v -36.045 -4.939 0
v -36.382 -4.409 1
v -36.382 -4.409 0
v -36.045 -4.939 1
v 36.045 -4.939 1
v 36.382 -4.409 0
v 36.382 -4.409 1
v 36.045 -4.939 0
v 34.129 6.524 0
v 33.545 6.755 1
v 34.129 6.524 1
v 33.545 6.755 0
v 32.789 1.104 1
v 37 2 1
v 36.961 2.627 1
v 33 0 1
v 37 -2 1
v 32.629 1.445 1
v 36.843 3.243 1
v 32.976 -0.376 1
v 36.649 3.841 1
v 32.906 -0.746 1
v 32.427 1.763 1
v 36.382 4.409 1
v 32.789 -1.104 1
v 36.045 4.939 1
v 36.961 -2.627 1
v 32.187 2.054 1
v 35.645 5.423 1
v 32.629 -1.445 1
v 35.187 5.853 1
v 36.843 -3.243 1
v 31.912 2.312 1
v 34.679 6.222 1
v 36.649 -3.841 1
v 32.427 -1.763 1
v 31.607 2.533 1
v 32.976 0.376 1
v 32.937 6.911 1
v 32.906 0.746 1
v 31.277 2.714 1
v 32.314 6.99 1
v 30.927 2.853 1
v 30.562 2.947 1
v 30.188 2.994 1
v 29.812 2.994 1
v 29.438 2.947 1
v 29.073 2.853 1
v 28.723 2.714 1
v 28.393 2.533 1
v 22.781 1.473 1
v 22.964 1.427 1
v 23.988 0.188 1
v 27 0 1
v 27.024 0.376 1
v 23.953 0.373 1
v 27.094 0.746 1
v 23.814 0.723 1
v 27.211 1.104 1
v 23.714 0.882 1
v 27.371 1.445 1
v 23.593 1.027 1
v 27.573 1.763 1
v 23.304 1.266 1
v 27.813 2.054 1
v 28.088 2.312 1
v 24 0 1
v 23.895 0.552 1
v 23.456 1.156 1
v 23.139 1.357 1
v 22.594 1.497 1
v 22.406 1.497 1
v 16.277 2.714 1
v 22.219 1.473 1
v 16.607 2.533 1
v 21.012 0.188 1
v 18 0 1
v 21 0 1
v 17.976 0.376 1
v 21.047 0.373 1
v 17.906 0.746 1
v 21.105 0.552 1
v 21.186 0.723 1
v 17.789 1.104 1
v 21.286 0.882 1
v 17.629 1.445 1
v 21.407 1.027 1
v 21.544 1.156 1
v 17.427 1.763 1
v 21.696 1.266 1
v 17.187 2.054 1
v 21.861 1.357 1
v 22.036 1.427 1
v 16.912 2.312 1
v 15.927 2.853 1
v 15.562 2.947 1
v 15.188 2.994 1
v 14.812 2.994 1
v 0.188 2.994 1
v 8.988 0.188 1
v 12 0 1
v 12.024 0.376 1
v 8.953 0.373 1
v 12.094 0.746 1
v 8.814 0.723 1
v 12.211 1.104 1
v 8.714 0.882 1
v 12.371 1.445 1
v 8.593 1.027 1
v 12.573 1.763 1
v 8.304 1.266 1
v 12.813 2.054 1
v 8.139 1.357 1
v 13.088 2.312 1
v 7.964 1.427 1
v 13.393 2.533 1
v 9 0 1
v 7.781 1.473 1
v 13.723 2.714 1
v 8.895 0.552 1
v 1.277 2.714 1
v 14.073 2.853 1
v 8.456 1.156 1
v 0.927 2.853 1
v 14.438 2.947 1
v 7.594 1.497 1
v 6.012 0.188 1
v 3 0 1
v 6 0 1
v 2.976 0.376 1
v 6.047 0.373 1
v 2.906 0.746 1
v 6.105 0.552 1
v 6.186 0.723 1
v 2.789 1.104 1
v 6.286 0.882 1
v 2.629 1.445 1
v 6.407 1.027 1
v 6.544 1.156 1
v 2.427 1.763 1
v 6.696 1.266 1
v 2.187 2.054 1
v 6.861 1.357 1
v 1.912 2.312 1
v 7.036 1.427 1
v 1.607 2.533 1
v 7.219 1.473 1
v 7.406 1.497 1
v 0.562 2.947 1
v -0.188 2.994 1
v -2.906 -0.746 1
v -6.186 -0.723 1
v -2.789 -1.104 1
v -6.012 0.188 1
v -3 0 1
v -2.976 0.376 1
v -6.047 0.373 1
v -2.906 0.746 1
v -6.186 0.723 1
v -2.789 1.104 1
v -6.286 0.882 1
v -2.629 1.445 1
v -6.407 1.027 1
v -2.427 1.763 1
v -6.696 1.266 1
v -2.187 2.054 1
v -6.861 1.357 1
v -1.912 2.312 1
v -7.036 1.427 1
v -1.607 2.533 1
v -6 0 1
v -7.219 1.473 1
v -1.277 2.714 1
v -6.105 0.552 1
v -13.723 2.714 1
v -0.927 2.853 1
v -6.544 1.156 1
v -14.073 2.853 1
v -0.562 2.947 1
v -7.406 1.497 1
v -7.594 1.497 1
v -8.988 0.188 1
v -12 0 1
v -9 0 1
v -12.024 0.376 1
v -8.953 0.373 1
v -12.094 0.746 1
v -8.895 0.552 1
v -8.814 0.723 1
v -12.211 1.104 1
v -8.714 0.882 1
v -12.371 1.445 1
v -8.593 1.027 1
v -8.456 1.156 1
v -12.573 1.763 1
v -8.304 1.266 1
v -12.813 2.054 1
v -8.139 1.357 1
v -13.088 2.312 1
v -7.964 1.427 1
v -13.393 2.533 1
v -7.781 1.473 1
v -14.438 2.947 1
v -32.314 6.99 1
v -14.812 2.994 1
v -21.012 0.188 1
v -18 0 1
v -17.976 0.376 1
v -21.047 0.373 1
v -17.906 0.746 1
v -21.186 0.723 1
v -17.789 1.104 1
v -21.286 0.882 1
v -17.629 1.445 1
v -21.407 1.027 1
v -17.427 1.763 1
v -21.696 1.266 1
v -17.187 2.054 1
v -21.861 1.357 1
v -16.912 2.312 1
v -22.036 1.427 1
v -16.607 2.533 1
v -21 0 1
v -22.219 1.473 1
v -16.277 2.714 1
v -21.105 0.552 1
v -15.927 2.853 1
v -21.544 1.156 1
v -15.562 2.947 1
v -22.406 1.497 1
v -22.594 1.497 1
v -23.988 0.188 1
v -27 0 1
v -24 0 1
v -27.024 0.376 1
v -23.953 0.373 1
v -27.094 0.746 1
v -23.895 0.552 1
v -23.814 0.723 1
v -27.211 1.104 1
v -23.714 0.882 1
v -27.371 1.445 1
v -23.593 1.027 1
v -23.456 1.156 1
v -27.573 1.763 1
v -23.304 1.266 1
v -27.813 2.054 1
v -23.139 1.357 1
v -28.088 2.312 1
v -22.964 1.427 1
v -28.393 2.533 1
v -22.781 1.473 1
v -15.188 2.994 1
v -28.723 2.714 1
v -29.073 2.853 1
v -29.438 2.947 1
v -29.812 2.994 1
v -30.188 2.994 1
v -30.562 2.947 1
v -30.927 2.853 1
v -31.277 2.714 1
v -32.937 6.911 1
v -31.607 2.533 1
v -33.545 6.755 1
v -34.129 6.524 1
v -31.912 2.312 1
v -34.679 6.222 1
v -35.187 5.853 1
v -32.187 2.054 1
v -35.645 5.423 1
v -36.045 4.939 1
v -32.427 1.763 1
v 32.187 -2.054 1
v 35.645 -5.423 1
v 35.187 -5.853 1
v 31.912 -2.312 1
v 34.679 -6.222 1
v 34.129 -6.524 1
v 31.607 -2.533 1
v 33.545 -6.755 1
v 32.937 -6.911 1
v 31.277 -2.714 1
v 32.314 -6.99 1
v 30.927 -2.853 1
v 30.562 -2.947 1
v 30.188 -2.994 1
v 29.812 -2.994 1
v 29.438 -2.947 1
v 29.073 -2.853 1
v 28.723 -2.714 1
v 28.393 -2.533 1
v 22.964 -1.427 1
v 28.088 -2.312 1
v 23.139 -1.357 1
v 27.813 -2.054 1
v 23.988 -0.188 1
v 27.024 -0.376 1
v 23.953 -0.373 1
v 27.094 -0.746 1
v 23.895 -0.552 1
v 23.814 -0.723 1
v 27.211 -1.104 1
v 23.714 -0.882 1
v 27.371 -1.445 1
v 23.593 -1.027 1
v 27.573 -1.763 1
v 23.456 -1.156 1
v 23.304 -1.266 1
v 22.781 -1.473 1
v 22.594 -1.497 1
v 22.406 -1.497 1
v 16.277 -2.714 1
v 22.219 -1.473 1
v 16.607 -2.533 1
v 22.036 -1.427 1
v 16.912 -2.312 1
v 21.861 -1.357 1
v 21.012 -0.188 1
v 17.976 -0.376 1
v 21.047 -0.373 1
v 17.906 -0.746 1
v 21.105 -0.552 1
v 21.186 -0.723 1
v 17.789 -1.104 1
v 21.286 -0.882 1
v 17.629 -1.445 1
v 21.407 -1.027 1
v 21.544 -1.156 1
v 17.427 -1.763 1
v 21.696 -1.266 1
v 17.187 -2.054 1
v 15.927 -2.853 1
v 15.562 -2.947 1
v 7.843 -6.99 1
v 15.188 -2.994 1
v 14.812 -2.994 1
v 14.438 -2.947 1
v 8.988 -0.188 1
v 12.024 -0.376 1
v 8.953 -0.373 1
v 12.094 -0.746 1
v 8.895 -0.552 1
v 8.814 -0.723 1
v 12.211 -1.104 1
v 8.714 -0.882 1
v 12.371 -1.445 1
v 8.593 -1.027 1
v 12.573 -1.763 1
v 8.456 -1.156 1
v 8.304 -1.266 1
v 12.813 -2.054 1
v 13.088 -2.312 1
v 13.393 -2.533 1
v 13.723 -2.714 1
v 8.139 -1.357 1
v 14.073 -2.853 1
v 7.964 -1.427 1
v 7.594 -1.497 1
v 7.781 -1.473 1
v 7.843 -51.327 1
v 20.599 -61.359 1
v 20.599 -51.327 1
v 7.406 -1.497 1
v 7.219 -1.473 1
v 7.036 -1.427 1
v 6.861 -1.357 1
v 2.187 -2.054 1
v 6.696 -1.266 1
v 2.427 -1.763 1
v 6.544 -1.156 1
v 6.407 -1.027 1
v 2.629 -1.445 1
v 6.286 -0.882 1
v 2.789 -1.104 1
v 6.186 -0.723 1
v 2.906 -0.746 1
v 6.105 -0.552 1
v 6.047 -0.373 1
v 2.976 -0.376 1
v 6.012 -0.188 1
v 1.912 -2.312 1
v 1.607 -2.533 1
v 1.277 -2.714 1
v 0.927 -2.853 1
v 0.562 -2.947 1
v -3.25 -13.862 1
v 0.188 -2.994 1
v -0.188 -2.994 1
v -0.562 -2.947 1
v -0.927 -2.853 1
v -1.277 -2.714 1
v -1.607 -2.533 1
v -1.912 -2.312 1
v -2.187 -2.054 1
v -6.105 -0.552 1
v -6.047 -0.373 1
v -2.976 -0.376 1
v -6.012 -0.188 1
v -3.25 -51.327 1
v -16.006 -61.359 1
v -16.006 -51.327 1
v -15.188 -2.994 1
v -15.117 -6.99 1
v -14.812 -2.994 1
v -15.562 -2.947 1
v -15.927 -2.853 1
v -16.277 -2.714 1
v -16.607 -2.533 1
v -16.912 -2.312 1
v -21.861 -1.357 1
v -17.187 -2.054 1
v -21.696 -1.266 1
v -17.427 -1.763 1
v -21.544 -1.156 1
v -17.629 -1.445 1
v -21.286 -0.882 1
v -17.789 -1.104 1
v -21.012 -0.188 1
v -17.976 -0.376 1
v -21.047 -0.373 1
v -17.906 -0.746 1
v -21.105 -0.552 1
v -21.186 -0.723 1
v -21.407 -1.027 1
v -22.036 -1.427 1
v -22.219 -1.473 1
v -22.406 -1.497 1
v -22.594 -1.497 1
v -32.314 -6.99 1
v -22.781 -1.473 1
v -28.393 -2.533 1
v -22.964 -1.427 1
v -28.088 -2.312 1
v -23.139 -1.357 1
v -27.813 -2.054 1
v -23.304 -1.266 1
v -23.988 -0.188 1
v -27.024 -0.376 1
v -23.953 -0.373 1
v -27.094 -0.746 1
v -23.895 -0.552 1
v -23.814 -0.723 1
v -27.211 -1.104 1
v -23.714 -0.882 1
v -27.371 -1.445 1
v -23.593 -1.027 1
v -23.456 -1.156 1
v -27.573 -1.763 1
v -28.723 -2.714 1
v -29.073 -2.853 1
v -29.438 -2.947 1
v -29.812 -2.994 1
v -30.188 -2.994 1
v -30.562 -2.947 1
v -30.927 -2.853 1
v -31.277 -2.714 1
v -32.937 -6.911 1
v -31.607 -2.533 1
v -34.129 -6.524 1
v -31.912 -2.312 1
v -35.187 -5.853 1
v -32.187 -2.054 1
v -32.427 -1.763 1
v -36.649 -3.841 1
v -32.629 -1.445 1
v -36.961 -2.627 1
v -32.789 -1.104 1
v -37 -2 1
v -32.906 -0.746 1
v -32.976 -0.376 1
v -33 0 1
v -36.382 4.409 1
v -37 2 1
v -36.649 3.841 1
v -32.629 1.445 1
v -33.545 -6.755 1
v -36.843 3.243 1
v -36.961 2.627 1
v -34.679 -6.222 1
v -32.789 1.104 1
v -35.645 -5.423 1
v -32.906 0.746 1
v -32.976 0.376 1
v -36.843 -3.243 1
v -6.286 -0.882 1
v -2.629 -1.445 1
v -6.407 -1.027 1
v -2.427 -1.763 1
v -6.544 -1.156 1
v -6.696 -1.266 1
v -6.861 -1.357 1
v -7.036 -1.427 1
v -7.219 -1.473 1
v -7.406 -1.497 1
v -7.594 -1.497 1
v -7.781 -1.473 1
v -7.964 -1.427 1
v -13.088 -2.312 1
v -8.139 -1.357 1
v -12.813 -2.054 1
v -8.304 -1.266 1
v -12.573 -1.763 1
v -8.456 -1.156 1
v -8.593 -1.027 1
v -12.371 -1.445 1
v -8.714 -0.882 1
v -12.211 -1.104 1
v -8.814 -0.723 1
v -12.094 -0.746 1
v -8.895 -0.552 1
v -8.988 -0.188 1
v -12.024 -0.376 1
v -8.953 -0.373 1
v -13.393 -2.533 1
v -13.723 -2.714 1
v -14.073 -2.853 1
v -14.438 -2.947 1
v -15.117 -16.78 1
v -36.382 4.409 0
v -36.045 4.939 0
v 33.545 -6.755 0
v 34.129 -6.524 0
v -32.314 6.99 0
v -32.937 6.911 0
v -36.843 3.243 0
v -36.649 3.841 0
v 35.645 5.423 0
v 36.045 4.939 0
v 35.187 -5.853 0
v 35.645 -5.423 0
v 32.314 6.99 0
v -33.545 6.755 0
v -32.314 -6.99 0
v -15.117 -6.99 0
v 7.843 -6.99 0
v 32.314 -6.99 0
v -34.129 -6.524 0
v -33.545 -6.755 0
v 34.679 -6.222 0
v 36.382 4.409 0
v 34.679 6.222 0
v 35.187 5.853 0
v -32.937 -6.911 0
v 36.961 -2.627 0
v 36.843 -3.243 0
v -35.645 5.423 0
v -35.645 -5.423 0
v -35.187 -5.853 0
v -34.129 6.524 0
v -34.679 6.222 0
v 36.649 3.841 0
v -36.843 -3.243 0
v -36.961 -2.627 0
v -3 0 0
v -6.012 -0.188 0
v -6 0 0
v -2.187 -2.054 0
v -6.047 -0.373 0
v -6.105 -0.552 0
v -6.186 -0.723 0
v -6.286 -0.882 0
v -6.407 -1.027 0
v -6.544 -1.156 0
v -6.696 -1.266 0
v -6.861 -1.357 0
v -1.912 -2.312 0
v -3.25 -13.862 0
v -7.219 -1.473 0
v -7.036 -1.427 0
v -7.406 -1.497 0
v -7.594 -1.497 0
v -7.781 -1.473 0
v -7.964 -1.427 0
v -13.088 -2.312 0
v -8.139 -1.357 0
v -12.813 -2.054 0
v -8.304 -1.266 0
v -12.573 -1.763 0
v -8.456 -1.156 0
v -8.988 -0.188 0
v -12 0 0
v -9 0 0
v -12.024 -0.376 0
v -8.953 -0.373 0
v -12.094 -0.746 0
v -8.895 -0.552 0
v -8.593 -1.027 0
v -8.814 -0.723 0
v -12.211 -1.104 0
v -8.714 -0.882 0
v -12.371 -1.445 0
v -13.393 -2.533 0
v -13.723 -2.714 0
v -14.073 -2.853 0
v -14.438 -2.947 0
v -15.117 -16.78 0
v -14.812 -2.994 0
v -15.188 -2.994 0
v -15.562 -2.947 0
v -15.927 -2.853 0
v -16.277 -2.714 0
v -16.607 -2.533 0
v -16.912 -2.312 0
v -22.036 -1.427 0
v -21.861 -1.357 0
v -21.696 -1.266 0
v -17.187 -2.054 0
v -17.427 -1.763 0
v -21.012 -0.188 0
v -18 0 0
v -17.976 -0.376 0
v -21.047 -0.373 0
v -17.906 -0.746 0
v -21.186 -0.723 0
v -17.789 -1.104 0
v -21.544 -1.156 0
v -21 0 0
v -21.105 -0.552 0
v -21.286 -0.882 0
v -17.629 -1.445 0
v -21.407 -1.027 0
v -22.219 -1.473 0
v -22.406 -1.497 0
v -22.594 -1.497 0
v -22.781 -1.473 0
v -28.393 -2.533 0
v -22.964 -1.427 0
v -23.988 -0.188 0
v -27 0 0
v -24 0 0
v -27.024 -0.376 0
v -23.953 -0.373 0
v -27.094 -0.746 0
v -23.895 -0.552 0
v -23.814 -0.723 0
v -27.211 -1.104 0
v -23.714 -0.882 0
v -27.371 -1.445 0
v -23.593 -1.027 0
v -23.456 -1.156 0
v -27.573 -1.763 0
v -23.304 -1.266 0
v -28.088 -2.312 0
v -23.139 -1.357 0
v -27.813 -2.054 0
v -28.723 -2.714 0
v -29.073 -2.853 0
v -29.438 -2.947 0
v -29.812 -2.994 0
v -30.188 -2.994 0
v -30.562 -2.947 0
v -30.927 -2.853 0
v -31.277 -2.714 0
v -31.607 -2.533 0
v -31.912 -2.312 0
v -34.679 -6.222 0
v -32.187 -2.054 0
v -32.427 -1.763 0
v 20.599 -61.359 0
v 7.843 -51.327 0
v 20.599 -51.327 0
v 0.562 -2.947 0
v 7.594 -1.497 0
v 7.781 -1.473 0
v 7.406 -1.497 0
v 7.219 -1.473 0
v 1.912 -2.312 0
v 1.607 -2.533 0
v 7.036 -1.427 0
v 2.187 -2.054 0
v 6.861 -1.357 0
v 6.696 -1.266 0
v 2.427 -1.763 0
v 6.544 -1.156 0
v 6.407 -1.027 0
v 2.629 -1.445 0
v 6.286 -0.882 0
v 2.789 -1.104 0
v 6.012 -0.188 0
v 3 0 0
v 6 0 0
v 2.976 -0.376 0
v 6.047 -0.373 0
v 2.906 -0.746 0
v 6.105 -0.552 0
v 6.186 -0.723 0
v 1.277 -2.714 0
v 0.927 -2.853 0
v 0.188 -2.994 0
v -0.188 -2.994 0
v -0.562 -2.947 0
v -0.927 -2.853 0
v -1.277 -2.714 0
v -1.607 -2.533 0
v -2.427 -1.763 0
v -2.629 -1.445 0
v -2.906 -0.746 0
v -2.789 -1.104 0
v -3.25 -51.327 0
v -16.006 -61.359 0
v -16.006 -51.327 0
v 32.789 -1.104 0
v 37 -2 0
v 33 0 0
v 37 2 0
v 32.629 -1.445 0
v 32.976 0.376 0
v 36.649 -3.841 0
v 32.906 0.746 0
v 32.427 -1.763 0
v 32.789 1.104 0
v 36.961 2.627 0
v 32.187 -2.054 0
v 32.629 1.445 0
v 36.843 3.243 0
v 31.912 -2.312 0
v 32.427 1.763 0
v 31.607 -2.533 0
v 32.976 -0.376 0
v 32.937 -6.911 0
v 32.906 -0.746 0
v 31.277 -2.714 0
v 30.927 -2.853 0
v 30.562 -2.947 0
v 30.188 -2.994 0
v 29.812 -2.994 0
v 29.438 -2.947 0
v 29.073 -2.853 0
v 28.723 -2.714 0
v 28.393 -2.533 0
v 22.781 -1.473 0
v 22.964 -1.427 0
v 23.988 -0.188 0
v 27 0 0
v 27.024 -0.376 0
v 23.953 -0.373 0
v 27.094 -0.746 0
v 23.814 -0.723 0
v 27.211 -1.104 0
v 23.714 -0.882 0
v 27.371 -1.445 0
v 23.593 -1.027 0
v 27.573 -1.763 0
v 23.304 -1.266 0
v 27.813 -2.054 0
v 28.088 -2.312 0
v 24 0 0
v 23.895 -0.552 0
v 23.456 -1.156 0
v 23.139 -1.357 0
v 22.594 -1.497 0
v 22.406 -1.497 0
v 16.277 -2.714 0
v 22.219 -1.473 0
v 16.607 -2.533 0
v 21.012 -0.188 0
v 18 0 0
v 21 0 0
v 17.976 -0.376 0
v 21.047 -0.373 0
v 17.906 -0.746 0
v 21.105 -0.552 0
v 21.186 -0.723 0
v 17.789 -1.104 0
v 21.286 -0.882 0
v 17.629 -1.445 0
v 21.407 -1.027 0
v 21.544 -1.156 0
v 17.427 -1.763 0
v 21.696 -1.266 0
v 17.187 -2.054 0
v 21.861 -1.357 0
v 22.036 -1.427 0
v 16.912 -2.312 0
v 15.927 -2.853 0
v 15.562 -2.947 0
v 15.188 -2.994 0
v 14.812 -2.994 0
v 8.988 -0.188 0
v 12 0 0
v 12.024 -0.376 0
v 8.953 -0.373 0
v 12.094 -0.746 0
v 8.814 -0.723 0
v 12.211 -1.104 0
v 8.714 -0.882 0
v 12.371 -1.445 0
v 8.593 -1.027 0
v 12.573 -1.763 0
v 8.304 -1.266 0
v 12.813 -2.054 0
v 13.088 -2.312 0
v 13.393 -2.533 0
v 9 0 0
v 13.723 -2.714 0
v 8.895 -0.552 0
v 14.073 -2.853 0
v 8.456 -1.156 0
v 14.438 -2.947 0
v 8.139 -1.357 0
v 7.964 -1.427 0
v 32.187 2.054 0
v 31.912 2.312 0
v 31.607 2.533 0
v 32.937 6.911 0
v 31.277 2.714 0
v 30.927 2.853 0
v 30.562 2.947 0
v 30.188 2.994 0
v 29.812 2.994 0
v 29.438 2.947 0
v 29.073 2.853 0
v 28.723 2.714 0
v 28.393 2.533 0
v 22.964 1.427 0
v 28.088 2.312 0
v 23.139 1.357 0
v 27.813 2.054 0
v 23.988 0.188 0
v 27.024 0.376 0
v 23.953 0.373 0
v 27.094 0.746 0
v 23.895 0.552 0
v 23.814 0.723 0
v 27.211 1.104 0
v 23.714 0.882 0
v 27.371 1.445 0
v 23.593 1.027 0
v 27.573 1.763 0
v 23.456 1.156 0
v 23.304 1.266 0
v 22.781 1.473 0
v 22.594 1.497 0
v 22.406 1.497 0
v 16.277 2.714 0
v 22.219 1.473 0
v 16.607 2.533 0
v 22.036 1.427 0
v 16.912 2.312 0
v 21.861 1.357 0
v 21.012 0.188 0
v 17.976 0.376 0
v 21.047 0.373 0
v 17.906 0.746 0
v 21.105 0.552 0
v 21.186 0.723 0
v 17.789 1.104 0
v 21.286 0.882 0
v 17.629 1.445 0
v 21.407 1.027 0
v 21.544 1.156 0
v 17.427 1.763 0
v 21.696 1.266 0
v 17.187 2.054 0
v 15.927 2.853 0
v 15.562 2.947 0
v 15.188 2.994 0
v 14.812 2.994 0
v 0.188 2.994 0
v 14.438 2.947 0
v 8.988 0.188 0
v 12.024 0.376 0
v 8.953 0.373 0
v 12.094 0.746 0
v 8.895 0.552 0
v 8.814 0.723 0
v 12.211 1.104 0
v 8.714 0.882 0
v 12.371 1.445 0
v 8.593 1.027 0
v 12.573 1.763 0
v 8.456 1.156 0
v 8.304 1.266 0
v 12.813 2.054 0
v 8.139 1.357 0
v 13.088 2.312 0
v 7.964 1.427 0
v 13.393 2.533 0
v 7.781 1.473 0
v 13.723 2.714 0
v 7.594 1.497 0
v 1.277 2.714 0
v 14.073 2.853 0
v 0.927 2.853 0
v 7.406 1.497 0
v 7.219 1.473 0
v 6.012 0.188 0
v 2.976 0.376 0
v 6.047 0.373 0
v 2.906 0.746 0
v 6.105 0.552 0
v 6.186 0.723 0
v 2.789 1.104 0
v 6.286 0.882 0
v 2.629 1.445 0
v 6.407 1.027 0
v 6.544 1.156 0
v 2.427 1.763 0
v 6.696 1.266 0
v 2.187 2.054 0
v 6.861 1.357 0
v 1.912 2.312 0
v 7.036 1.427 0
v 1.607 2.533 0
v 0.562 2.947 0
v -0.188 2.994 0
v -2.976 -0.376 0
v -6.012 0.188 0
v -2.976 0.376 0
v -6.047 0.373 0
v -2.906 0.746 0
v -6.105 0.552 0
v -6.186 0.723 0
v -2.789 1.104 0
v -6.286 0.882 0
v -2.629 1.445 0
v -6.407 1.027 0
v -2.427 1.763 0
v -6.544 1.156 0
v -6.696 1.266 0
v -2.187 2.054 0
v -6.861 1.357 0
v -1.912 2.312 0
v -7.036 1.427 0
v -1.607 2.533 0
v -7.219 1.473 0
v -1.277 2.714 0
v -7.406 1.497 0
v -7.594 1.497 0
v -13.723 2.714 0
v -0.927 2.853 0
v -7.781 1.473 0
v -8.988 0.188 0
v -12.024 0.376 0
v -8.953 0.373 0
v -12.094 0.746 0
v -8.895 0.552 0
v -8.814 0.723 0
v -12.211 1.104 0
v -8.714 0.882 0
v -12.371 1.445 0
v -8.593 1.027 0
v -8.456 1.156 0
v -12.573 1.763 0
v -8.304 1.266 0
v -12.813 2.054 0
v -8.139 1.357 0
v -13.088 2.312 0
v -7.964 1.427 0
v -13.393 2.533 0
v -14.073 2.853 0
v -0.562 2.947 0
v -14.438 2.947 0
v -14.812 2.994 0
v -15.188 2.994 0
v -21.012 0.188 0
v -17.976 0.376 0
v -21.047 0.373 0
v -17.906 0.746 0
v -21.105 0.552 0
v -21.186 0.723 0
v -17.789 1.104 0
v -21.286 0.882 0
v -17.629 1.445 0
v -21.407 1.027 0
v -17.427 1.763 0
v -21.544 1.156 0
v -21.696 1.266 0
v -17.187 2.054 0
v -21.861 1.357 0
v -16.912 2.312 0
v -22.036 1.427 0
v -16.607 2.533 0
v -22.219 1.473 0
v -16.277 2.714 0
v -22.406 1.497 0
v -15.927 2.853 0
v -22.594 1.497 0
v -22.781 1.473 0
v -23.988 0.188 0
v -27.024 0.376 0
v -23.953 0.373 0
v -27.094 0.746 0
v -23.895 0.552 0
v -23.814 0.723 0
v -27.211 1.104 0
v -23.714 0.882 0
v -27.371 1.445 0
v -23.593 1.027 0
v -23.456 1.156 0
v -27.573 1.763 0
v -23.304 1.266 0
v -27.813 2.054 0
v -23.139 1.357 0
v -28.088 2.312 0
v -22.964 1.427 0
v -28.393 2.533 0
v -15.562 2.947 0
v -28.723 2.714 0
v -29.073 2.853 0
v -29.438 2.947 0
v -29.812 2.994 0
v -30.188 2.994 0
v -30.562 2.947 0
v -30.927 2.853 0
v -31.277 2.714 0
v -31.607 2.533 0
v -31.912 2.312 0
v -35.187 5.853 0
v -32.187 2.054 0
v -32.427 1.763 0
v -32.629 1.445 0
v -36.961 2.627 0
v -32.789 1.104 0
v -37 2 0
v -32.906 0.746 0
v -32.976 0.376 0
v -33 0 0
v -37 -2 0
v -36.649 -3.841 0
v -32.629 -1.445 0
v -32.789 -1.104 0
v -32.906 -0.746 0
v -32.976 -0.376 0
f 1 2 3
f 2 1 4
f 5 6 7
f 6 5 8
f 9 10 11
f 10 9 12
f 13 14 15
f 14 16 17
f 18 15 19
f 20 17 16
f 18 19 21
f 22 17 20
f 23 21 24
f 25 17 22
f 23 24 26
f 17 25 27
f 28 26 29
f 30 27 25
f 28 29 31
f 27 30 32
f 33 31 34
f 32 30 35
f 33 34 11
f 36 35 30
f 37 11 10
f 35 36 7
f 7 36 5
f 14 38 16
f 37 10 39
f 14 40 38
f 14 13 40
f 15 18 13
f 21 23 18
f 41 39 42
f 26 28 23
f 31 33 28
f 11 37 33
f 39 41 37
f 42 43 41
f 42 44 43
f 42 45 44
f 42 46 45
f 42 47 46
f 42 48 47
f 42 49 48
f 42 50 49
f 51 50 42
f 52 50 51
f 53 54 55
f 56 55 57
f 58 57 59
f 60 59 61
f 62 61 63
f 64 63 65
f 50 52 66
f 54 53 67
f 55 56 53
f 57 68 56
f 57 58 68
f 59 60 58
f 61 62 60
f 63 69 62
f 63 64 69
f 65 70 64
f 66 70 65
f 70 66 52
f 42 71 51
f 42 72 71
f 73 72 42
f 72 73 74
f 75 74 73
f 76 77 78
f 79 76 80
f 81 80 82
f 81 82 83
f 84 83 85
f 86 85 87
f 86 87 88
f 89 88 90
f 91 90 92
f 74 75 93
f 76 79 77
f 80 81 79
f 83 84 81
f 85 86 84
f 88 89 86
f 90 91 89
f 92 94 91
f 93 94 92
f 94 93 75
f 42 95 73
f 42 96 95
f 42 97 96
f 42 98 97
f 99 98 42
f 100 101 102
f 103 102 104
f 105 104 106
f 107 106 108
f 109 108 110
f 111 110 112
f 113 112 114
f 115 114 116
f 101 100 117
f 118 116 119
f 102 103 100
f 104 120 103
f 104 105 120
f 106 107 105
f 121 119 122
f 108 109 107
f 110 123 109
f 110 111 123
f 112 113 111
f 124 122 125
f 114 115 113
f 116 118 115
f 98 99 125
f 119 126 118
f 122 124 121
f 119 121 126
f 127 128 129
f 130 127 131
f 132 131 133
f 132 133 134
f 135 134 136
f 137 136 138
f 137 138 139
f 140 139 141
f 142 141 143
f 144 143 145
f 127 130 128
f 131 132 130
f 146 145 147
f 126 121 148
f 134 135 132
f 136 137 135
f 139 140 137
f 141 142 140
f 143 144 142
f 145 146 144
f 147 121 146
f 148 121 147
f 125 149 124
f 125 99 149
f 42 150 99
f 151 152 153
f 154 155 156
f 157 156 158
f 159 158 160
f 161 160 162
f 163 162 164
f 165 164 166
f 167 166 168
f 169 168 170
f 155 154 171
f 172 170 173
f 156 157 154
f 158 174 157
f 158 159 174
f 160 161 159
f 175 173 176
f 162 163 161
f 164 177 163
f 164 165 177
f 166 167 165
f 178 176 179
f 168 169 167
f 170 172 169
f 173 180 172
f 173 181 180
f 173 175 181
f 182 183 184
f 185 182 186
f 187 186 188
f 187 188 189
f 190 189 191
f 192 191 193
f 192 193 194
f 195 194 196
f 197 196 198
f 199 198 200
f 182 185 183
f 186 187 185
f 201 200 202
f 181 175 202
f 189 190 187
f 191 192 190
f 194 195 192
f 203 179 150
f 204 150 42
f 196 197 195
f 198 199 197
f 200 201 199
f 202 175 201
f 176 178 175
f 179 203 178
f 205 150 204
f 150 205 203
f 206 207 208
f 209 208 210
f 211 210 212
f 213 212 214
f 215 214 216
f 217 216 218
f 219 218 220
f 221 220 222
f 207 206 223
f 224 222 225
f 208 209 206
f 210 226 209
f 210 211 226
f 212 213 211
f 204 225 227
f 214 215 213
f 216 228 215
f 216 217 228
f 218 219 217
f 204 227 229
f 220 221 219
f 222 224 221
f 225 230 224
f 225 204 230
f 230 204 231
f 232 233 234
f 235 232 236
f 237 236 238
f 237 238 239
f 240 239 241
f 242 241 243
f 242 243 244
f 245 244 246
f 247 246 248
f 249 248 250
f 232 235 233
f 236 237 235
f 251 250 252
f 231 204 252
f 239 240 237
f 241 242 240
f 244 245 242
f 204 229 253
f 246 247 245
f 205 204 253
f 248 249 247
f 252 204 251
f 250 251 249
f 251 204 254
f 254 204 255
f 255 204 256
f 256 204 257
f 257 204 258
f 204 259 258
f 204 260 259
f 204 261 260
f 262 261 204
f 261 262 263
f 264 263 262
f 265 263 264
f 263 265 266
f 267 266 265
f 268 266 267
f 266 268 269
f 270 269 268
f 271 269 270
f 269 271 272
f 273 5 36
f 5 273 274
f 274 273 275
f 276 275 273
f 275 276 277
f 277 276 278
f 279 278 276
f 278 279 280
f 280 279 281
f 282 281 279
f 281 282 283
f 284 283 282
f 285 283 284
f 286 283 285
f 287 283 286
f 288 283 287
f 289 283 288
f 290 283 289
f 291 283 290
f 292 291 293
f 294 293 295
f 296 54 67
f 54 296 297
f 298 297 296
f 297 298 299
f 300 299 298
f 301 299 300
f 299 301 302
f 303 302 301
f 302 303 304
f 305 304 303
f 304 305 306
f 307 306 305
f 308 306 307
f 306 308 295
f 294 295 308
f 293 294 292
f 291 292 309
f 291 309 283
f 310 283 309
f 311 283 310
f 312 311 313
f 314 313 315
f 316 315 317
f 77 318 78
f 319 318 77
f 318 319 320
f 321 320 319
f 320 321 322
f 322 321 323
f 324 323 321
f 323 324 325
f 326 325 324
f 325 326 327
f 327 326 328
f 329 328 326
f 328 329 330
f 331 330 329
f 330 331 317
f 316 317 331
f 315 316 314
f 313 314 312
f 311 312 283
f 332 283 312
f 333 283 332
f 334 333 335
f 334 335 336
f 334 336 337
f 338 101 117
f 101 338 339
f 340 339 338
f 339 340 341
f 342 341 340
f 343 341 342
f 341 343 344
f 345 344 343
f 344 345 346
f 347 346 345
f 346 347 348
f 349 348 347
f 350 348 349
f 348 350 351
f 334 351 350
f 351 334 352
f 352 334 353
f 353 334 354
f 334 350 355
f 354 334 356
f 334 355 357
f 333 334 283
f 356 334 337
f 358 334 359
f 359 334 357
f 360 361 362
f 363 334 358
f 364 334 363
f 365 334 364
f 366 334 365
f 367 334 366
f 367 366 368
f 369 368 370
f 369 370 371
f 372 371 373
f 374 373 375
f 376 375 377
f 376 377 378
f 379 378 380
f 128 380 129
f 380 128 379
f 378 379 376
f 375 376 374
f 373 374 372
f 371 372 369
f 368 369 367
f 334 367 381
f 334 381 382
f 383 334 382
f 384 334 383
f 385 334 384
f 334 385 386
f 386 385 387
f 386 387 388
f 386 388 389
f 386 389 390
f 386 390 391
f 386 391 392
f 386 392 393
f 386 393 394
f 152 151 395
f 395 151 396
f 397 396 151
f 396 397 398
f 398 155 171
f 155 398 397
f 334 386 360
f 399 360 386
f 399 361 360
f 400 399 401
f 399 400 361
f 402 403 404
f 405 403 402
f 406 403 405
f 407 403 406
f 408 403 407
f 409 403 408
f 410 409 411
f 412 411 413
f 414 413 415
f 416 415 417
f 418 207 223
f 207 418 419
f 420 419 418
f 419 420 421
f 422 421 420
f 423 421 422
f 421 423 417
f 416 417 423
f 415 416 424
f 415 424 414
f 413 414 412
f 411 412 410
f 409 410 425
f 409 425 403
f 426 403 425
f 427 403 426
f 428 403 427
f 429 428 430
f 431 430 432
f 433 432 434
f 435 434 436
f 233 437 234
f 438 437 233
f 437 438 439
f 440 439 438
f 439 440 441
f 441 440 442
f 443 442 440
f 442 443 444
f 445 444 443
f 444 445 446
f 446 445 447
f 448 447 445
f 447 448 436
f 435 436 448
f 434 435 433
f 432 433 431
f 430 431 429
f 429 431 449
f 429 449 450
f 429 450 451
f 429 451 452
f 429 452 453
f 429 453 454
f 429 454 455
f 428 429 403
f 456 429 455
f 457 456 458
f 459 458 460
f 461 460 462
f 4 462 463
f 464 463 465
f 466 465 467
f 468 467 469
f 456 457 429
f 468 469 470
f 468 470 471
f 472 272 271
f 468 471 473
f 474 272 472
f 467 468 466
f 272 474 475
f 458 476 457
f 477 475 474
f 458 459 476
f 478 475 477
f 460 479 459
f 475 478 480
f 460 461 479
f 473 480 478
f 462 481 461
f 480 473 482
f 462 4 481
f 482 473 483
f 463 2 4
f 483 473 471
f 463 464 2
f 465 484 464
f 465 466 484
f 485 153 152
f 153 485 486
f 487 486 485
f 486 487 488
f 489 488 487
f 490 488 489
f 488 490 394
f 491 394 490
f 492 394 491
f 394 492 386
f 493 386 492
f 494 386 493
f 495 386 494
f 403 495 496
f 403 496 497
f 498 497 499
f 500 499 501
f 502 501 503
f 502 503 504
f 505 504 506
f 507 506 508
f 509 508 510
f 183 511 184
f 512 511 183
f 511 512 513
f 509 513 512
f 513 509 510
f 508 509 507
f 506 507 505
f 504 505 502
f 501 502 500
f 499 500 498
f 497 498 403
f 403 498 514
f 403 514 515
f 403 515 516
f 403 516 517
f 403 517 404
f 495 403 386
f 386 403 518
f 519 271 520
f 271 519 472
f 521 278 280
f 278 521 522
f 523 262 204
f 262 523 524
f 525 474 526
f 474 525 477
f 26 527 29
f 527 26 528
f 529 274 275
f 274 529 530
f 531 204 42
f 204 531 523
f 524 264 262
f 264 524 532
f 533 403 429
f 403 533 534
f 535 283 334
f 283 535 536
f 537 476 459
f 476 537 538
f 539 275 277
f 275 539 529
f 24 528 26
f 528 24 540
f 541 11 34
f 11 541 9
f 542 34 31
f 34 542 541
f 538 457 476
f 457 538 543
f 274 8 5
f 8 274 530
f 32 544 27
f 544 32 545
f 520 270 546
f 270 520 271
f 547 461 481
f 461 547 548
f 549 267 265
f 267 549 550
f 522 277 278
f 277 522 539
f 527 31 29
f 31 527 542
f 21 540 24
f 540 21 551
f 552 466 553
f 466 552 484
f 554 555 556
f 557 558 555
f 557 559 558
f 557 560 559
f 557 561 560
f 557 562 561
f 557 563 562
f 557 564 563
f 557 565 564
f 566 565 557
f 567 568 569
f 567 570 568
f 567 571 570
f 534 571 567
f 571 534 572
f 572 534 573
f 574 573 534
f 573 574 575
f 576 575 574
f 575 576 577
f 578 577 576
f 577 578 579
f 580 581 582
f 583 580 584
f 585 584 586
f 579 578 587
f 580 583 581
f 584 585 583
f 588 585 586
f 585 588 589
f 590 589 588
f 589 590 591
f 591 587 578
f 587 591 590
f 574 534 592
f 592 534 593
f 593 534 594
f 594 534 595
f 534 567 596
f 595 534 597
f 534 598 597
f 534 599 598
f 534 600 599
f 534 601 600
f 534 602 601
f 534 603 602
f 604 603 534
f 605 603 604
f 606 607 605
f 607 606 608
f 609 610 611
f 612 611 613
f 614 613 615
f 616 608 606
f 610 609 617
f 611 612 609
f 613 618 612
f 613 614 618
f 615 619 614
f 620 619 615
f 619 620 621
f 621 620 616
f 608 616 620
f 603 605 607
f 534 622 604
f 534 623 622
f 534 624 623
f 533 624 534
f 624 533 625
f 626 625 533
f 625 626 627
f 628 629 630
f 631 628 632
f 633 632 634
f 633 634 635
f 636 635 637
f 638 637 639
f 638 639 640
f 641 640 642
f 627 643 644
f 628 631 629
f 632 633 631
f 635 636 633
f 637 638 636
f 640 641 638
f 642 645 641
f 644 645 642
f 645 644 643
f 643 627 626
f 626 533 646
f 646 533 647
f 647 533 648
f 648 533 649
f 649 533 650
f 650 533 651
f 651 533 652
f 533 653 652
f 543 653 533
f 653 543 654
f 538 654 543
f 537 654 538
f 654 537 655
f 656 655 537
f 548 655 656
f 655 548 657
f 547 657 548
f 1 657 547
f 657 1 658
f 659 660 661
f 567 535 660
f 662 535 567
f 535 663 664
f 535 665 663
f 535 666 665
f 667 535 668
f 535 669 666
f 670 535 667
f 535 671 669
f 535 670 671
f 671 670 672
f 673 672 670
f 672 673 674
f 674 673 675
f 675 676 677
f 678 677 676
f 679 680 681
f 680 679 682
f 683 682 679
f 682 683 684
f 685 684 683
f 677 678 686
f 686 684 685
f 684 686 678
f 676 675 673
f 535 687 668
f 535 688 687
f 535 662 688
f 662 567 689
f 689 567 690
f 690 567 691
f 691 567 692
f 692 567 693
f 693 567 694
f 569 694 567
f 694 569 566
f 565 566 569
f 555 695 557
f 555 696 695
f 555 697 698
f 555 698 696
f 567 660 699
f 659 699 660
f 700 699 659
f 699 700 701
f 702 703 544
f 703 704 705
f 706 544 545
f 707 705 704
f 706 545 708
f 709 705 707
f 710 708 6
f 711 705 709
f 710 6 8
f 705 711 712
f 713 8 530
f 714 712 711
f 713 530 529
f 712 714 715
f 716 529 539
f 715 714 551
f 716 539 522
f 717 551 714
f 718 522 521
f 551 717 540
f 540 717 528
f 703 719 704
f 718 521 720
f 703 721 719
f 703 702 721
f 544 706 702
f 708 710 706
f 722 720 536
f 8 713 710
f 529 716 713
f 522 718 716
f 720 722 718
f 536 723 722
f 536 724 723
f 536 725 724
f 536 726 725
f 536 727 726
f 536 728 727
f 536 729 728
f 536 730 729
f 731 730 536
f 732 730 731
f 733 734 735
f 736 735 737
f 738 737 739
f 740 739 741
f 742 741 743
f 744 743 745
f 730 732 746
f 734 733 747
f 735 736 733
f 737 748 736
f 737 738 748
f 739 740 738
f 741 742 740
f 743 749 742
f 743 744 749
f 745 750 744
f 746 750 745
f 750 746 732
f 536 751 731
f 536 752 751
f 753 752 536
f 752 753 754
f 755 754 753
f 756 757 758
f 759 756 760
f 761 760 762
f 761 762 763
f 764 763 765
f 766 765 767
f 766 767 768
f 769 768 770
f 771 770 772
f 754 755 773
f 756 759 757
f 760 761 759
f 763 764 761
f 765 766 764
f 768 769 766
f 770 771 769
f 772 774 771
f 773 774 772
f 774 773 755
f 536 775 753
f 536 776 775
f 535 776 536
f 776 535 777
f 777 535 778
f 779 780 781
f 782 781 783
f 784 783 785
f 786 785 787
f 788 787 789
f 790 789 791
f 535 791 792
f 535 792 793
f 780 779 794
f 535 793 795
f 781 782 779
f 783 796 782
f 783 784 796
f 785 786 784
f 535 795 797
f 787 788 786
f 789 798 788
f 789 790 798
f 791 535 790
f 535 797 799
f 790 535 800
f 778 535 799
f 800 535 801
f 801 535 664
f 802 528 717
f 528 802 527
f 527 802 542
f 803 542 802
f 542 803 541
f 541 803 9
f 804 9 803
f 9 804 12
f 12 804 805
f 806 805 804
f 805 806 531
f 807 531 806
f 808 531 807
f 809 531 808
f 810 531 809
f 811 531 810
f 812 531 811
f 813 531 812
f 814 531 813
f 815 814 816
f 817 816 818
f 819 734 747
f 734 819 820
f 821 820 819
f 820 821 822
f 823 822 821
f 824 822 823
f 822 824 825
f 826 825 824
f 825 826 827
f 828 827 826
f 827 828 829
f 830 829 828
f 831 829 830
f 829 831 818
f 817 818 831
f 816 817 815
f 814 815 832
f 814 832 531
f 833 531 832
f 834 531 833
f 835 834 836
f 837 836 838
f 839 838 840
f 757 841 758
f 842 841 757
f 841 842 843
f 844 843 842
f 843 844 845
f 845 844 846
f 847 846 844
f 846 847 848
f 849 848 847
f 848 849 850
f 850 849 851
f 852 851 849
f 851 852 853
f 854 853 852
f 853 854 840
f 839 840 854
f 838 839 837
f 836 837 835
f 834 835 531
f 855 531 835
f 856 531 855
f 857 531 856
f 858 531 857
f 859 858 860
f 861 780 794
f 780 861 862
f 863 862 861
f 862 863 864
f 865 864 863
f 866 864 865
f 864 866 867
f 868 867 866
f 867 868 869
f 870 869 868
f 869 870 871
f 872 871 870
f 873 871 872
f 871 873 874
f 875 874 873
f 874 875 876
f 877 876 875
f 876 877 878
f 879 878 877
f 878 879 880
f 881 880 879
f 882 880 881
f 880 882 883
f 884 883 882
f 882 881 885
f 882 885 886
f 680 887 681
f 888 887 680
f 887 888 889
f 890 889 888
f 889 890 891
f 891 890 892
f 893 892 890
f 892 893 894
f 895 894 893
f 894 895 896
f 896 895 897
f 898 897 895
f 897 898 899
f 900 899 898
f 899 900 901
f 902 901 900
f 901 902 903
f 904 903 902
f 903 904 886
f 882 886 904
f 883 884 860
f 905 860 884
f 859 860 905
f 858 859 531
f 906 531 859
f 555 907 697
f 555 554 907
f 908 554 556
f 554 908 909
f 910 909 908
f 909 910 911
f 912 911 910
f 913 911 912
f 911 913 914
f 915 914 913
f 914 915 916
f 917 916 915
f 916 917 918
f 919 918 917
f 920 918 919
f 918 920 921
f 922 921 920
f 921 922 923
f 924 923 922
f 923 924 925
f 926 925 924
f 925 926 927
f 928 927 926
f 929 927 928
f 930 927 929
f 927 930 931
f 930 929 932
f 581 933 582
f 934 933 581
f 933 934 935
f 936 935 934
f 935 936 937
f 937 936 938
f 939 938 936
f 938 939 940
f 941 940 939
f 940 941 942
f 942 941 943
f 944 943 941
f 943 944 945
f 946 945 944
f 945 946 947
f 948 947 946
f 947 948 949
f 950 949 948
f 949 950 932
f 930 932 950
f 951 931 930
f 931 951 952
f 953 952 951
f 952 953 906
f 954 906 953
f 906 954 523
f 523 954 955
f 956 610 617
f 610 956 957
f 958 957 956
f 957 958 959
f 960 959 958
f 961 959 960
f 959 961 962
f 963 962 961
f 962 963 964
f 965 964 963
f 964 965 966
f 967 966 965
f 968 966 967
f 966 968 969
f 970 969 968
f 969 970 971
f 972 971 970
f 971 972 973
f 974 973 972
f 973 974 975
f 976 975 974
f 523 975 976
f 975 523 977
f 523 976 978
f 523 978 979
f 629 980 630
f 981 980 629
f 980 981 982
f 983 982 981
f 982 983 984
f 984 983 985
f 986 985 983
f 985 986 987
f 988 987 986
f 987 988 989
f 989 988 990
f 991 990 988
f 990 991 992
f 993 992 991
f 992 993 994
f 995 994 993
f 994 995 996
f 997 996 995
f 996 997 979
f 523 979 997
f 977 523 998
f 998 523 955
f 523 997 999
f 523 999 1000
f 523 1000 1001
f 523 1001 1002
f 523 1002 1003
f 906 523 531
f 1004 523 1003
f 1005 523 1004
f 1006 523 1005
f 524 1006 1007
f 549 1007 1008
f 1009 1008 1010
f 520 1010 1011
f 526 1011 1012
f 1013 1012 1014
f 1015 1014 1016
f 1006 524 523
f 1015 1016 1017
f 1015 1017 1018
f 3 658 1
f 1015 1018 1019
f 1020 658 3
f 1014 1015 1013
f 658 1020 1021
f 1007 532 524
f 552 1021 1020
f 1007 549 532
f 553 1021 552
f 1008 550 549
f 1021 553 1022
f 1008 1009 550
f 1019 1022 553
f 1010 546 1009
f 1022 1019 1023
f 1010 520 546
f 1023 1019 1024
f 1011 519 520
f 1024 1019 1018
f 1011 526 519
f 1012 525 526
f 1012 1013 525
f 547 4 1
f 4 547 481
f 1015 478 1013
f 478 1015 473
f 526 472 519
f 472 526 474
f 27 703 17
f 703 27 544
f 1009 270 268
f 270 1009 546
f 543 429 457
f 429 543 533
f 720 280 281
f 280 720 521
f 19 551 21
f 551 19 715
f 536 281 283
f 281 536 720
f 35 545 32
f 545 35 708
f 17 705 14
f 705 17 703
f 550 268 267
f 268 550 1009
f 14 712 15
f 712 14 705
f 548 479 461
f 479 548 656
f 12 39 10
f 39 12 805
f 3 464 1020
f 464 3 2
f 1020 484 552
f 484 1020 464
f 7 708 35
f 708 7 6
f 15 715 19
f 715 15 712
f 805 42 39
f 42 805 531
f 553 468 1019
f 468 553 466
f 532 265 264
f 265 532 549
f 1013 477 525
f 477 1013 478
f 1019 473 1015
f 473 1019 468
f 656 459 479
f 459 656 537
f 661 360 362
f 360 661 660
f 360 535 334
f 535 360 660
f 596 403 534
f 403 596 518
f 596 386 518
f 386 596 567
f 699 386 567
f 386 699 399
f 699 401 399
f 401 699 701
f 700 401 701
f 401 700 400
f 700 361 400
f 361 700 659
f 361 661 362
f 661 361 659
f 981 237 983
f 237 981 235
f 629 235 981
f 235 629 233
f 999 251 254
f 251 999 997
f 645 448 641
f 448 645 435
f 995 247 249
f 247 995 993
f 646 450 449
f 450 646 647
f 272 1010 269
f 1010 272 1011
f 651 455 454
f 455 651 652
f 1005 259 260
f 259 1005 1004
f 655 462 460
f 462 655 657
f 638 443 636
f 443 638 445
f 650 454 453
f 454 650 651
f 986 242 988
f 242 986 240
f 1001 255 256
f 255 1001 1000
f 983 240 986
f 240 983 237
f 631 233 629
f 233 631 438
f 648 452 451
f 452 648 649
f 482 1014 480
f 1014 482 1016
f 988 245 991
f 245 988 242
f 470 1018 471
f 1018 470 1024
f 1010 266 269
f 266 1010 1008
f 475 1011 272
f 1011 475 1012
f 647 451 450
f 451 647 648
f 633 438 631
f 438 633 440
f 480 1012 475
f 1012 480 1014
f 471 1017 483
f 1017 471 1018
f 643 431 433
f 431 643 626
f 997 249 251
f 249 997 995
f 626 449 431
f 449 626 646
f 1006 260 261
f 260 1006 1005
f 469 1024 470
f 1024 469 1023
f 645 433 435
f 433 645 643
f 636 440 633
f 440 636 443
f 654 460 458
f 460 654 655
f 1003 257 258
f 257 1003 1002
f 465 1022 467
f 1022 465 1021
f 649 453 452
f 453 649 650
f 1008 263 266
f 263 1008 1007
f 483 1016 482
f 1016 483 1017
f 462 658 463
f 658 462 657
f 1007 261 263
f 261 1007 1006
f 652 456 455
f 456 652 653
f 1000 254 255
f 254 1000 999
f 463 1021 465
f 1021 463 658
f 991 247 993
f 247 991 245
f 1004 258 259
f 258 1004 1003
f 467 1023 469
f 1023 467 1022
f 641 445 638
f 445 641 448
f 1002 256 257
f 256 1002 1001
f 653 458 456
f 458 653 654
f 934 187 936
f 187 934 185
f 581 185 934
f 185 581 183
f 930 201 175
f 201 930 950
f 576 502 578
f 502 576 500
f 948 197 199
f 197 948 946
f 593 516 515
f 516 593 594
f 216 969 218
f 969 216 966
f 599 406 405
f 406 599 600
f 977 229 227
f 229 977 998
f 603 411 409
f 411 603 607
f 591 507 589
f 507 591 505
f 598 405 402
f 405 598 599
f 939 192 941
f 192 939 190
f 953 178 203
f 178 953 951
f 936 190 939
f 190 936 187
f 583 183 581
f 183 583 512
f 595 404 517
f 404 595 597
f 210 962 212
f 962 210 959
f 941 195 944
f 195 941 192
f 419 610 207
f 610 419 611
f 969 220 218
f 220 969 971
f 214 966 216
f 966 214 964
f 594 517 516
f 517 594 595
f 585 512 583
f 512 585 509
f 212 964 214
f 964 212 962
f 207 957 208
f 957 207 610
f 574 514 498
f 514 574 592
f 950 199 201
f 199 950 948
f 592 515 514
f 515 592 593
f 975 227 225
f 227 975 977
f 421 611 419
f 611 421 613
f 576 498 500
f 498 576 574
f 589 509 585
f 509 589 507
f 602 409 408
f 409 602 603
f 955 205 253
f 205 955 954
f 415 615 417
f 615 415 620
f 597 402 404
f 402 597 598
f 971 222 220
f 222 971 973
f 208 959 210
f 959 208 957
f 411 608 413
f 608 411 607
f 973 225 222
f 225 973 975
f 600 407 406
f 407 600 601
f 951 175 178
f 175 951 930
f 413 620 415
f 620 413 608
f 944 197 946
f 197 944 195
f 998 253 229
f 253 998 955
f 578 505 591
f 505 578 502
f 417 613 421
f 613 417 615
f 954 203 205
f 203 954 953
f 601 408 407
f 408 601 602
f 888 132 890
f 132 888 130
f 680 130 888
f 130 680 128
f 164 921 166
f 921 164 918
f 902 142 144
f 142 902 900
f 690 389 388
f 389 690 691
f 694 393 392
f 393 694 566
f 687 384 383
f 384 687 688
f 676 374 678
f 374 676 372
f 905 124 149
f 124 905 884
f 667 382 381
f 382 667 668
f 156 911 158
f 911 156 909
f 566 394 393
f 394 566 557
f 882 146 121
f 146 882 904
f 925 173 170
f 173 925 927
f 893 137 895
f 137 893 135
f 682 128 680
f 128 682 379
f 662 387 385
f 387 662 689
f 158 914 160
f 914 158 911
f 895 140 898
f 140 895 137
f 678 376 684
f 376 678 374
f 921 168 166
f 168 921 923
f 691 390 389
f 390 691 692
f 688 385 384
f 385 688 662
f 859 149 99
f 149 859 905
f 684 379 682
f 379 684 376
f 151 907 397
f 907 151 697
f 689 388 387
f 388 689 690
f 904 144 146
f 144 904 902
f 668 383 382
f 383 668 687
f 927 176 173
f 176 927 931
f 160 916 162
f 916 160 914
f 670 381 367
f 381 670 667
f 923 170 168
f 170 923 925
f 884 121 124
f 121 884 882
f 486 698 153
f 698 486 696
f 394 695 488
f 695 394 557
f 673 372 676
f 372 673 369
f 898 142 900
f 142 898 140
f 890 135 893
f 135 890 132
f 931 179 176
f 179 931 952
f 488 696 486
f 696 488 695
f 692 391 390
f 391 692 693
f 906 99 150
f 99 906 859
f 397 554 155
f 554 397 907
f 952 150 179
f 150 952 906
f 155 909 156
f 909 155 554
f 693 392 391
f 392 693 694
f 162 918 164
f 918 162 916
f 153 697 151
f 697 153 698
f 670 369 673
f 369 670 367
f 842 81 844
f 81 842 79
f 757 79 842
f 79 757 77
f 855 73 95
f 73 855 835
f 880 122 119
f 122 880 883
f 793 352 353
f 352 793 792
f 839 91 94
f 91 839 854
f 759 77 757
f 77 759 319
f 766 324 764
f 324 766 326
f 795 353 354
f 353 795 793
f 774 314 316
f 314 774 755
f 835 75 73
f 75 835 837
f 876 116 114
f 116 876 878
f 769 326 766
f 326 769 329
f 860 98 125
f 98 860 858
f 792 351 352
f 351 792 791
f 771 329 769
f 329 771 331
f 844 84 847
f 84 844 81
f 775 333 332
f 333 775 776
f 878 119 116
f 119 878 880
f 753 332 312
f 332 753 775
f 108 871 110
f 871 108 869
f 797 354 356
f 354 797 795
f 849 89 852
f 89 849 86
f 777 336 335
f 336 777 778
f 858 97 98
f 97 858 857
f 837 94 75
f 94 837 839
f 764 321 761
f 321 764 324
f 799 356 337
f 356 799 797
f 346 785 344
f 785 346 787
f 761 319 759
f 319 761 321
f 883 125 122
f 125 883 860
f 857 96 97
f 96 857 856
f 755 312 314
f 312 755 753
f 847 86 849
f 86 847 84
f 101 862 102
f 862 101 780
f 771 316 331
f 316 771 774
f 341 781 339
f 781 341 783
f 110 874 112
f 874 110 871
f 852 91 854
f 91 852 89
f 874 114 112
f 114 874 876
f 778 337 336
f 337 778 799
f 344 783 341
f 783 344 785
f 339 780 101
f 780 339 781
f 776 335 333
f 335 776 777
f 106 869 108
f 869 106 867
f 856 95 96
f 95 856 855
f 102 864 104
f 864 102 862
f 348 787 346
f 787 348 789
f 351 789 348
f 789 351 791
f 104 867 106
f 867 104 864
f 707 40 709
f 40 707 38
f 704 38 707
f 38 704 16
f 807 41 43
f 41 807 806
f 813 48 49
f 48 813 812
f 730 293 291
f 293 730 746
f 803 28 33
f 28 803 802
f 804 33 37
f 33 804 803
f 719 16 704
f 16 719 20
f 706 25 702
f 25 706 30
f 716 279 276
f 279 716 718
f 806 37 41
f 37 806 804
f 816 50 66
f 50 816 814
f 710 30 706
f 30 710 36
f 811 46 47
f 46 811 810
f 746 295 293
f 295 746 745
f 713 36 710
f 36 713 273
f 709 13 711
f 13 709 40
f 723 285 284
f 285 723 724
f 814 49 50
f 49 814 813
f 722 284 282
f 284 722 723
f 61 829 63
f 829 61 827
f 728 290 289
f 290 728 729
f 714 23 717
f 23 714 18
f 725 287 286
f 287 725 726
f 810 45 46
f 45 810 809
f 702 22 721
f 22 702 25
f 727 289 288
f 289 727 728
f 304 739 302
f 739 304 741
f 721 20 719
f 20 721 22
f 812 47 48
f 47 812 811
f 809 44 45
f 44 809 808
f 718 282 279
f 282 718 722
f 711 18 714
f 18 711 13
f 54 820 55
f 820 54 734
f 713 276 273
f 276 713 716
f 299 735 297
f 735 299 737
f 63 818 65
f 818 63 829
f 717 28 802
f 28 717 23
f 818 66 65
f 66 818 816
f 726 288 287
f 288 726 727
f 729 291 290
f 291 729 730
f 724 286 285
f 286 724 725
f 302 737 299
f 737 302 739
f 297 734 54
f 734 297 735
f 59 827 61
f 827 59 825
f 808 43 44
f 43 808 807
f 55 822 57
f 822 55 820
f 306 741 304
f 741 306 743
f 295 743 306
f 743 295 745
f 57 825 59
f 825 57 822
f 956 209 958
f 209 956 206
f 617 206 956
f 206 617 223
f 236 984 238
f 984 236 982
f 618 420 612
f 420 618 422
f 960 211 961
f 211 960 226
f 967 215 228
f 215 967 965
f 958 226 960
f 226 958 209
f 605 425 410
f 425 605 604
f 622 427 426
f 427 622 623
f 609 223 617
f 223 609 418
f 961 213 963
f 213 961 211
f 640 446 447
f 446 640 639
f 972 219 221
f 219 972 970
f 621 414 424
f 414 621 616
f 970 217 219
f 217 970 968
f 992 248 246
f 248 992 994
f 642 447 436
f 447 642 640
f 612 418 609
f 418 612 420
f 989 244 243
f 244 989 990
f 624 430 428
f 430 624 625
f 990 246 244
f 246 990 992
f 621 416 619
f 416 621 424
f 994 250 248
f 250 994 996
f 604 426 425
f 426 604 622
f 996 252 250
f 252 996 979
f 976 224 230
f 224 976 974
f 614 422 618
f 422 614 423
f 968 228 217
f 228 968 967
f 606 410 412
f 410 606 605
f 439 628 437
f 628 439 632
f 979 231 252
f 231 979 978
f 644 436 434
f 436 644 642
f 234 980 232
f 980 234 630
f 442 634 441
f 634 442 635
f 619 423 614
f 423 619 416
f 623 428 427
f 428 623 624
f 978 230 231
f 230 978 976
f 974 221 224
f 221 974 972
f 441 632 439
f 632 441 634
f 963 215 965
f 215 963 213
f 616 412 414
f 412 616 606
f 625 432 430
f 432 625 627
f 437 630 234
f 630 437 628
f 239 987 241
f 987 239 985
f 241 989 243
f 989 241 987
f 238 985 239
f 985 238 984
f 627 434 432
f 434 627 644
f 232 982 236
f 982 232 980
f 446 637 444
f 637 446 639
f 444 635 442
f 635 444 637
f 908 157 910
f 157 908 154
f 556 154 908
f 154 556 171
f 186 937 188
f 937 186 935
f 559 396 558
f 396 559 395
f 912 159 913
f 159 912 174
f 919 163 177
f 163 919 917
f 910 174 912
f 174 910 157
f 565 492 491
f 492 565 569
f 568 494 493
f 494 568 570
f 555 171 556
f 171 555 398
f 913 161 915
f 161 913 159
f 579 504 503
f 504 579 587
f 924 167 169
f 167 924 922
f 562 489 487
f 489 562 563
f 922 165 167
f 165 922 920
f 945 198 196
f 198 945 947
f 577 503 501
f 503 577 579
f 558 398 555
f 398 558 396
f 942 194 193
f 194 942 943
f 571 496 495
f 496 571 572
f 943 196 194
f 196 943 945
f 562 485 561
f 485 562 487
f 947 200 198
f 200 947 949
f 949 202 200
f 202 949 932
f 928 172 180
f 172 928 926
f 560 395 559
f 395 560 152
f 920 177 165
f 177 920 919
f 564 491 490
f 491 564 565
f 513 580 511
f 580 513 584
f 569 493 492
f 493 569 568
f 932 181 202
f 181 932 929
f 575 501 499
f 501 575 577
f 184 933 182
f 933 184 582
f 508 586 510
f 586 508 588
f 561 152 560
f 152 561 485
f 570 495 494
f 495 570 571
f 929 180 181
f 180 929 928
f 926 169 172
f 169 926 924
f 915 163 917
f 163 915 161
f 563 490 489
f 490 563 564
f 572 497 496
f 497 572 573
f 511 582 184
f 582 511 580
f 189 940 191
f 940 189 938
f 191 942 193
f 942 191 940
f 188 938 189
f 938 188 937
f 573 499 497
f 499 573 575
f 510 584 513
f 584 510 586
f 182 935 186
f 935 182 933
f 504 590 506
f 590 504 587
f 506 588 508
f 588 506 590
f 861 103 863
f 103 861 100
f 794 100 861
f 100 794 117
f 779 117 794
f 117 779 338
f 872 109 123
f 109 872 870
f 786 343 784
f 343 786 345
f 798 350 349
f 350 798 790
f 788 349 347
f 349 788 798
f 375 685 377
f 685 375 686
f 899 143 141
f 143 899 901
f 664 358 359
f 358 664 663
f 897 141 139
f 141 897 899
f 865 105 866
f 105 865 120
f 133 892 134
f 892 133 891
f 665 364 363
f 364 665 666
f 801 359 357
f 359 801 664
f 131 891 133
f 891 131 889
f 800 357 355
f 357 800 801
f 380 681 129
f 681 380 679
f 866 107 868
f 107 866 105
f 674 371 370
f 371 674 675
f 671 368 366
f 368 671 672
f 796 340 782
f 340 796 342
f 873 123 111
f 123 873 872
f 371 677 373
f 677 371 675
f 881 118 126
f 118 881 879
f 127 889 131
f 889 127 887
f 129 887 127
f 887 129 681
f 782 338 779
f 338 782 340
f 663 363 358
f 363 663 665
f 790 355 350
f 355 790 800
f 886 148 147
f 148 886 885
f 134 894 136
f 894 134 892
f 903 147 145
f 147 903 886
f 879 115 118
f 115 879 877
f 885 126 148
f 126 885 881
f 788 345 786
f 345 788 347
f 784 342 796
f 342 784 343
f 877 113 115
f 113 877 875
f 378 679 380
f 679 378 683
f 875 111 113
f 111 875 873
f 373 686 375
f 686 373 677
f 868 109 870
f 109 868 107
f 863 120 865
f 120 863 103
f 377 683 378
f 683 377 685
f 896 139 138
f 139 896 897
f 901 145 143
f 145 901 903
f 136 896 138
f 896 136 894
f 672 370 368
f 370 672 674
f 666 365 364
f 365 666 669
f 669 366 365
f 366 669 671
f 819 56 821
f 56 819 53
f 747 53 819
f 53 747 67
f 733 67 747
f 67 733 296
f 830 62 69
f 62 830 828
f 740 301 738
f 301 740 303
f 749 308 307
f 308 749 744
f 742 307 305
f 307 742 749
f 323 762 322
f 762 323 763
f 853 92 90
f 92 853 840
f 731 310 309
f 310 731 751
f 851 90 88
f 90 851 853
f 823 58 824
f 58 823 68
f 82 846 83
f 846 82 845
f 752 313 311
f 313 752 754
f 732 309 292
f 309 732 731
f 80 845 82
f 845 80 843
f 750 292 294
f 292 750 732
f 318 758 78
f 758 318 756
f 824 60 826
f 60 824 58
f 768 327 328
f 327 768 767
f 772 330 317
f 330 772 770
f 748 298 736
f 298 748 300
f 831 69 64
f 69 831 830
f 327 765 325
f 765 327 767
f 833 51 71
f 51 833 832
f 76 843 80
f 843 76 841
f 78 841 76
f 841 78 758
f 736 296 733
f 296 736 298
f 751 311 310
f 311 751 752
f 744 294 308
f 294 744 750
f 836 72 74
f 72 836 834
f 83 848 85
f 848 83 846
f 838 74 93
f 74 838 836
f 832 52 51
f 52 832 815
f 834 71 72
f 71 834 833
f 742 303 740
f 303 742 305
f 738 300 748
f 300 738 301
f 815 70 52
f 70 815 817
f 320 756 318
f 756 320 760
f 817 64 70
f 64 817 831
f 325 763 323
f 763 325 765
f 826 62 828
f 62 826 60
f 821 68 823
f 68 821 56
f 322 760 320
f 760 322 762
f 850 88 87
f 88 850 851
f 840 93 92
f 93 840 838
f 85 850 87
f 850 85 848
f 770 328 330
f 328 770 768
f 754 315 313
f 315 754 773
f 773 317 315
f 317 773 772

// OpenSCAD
$fn = 50;


difference() {
	union() {
		*color(alpha = 1.0000000000, c = "gray") {
			translate(v = [0, 14, 0]) {
				linear_extrude(height = 1) {
					text(font = "Arial:style=Bold", halign = "center", size = 4.5000000000, text = "COMMENT description oobb_plate_shape_p_type_1_depth_5_width_1_thickness_1_extra_oobb_size", valign = "center");
				}
			}
		}
		hull() {
			translate(v = [-32.0000000000, 2.0000000000, 0]) {
				cylinder(h = 1, r = 5);
			}
			translate(v = [32.0000000000, 2.0000000000, 0]) {
				cylinder(h = 1, r = 5);
			}
			translate(v = [-32.0000000000, -2.0000000000, 0]) {
				cylinder(h = 1, r = 5);
			}
			translate(v = [32.0000000000, -2.0000000000, 0]) {
				cylinder(h = 1, r = 5);
			}
		}
		translate(v = [0, -5, 0]) {
			linear_extrude(height = 1) {
				text(font = "DejaVu Sans Mono:style=Bold", halign = "center", size = 57.0000000000, text = "1", valign = "top");
			}
		}
	}
	union() {
		*color(alpha = 1.0000000000, c = "gray") {
			translate(v = [0, 14, 0]) {
				linear_extrude(height = 1) {
					text(font = "Arial:style=Bold", halign = "center", size = 4.5000000000, text = "COMMENT description oobb_holes_shape_n_type_5_width_1_thickness_1_extra_oobb_size_1_height_'all'_holes_true_both_holes", valign = "center");
				}
			}
		}
		translate(v = [-30.0000000000, 0.0000000000, 0]) {
			translate(v = [0, 0, -50]) {
				cylinder(h = 100, r = 3.0000000000);
			}
		}
		translate(v = [-15.0000000000, 0.0000000000, 0]) {
			translate(v = [0, 0, -50]) {
				cylinder(h = 100, r = 3.0000000000);
			}
		}
		translate(v = [0, 0, -50]) {
			cylinder(h = 100, r = 3.0000000000);
		}
		translate(v = [15.0000000000, 0.0000000000, 0]) {
			translate(v = [0, 0, -50]) {
				cylinder(h = 100, r = 3.0000000000);
			}
		}
		translate(v = [30.0000000000, 0.0000000000, 0]) {
			translate(v = [0, 0, -50]) {
				cylinder(h = 100, r = 3.0000000000);
			}
		}
		translate(v = [-30.0000000000, 0.0000000000, 0]) {
			translate(v = [0, 0, -50]) {
				cylinder(h = 100, r = 1.5000000000);
			}
		}
		translate(v = [-22.5000000000, 0.0000000000, 0]) {
			translate(v = [0, 0, -50]) {
				cylinder(h = 100, r = 1.5000000000);
			}
		}
		translate(v = [-15.0000000000, 0.0000000000, 0]) {
			translate(v = [0, 0, -50]) {
				cylinder(h = 100, r = 1.5000000000);
			}
		}
		translate(v = [-7.5000000000, 0.0000000000, 0]) {
			translate(v = [0, 0, -50]) {
				cylinder(h = 100, r = 1.5000000000);
			}
		}
		translate(v = [0, 0, -50]) {
			cylinder(h = 100, r = 1.5000000000);
		}
		translate(v = [7.5000000000, 0.0000000000, 0]) {
			translate(v = [0, 0, -50]) {
				cylinder(h = 100, r = 1.5000000000);
			}
		}
		translate(v = [15.0000000000, 0.0000000000, 0]) {
			translate(v = [0, 0, -50]) {
				cylinder(h = 100, r = 1.5000000000);
			}
		}
		translate(v = [22.5000000000, 0.0000000000, 0]) {
			translate(v = [0, 0, -50]) {
				cylinder(h = 100, r = 1.5000000000);
			}
		}
		translate(v = [30.0000000000, 0.0000000000, 0]) {
			translate(v = [0, 0, -50]) {
				cylinder(h = 100, r = 1.5000000000);
			}
		}
	}
}
